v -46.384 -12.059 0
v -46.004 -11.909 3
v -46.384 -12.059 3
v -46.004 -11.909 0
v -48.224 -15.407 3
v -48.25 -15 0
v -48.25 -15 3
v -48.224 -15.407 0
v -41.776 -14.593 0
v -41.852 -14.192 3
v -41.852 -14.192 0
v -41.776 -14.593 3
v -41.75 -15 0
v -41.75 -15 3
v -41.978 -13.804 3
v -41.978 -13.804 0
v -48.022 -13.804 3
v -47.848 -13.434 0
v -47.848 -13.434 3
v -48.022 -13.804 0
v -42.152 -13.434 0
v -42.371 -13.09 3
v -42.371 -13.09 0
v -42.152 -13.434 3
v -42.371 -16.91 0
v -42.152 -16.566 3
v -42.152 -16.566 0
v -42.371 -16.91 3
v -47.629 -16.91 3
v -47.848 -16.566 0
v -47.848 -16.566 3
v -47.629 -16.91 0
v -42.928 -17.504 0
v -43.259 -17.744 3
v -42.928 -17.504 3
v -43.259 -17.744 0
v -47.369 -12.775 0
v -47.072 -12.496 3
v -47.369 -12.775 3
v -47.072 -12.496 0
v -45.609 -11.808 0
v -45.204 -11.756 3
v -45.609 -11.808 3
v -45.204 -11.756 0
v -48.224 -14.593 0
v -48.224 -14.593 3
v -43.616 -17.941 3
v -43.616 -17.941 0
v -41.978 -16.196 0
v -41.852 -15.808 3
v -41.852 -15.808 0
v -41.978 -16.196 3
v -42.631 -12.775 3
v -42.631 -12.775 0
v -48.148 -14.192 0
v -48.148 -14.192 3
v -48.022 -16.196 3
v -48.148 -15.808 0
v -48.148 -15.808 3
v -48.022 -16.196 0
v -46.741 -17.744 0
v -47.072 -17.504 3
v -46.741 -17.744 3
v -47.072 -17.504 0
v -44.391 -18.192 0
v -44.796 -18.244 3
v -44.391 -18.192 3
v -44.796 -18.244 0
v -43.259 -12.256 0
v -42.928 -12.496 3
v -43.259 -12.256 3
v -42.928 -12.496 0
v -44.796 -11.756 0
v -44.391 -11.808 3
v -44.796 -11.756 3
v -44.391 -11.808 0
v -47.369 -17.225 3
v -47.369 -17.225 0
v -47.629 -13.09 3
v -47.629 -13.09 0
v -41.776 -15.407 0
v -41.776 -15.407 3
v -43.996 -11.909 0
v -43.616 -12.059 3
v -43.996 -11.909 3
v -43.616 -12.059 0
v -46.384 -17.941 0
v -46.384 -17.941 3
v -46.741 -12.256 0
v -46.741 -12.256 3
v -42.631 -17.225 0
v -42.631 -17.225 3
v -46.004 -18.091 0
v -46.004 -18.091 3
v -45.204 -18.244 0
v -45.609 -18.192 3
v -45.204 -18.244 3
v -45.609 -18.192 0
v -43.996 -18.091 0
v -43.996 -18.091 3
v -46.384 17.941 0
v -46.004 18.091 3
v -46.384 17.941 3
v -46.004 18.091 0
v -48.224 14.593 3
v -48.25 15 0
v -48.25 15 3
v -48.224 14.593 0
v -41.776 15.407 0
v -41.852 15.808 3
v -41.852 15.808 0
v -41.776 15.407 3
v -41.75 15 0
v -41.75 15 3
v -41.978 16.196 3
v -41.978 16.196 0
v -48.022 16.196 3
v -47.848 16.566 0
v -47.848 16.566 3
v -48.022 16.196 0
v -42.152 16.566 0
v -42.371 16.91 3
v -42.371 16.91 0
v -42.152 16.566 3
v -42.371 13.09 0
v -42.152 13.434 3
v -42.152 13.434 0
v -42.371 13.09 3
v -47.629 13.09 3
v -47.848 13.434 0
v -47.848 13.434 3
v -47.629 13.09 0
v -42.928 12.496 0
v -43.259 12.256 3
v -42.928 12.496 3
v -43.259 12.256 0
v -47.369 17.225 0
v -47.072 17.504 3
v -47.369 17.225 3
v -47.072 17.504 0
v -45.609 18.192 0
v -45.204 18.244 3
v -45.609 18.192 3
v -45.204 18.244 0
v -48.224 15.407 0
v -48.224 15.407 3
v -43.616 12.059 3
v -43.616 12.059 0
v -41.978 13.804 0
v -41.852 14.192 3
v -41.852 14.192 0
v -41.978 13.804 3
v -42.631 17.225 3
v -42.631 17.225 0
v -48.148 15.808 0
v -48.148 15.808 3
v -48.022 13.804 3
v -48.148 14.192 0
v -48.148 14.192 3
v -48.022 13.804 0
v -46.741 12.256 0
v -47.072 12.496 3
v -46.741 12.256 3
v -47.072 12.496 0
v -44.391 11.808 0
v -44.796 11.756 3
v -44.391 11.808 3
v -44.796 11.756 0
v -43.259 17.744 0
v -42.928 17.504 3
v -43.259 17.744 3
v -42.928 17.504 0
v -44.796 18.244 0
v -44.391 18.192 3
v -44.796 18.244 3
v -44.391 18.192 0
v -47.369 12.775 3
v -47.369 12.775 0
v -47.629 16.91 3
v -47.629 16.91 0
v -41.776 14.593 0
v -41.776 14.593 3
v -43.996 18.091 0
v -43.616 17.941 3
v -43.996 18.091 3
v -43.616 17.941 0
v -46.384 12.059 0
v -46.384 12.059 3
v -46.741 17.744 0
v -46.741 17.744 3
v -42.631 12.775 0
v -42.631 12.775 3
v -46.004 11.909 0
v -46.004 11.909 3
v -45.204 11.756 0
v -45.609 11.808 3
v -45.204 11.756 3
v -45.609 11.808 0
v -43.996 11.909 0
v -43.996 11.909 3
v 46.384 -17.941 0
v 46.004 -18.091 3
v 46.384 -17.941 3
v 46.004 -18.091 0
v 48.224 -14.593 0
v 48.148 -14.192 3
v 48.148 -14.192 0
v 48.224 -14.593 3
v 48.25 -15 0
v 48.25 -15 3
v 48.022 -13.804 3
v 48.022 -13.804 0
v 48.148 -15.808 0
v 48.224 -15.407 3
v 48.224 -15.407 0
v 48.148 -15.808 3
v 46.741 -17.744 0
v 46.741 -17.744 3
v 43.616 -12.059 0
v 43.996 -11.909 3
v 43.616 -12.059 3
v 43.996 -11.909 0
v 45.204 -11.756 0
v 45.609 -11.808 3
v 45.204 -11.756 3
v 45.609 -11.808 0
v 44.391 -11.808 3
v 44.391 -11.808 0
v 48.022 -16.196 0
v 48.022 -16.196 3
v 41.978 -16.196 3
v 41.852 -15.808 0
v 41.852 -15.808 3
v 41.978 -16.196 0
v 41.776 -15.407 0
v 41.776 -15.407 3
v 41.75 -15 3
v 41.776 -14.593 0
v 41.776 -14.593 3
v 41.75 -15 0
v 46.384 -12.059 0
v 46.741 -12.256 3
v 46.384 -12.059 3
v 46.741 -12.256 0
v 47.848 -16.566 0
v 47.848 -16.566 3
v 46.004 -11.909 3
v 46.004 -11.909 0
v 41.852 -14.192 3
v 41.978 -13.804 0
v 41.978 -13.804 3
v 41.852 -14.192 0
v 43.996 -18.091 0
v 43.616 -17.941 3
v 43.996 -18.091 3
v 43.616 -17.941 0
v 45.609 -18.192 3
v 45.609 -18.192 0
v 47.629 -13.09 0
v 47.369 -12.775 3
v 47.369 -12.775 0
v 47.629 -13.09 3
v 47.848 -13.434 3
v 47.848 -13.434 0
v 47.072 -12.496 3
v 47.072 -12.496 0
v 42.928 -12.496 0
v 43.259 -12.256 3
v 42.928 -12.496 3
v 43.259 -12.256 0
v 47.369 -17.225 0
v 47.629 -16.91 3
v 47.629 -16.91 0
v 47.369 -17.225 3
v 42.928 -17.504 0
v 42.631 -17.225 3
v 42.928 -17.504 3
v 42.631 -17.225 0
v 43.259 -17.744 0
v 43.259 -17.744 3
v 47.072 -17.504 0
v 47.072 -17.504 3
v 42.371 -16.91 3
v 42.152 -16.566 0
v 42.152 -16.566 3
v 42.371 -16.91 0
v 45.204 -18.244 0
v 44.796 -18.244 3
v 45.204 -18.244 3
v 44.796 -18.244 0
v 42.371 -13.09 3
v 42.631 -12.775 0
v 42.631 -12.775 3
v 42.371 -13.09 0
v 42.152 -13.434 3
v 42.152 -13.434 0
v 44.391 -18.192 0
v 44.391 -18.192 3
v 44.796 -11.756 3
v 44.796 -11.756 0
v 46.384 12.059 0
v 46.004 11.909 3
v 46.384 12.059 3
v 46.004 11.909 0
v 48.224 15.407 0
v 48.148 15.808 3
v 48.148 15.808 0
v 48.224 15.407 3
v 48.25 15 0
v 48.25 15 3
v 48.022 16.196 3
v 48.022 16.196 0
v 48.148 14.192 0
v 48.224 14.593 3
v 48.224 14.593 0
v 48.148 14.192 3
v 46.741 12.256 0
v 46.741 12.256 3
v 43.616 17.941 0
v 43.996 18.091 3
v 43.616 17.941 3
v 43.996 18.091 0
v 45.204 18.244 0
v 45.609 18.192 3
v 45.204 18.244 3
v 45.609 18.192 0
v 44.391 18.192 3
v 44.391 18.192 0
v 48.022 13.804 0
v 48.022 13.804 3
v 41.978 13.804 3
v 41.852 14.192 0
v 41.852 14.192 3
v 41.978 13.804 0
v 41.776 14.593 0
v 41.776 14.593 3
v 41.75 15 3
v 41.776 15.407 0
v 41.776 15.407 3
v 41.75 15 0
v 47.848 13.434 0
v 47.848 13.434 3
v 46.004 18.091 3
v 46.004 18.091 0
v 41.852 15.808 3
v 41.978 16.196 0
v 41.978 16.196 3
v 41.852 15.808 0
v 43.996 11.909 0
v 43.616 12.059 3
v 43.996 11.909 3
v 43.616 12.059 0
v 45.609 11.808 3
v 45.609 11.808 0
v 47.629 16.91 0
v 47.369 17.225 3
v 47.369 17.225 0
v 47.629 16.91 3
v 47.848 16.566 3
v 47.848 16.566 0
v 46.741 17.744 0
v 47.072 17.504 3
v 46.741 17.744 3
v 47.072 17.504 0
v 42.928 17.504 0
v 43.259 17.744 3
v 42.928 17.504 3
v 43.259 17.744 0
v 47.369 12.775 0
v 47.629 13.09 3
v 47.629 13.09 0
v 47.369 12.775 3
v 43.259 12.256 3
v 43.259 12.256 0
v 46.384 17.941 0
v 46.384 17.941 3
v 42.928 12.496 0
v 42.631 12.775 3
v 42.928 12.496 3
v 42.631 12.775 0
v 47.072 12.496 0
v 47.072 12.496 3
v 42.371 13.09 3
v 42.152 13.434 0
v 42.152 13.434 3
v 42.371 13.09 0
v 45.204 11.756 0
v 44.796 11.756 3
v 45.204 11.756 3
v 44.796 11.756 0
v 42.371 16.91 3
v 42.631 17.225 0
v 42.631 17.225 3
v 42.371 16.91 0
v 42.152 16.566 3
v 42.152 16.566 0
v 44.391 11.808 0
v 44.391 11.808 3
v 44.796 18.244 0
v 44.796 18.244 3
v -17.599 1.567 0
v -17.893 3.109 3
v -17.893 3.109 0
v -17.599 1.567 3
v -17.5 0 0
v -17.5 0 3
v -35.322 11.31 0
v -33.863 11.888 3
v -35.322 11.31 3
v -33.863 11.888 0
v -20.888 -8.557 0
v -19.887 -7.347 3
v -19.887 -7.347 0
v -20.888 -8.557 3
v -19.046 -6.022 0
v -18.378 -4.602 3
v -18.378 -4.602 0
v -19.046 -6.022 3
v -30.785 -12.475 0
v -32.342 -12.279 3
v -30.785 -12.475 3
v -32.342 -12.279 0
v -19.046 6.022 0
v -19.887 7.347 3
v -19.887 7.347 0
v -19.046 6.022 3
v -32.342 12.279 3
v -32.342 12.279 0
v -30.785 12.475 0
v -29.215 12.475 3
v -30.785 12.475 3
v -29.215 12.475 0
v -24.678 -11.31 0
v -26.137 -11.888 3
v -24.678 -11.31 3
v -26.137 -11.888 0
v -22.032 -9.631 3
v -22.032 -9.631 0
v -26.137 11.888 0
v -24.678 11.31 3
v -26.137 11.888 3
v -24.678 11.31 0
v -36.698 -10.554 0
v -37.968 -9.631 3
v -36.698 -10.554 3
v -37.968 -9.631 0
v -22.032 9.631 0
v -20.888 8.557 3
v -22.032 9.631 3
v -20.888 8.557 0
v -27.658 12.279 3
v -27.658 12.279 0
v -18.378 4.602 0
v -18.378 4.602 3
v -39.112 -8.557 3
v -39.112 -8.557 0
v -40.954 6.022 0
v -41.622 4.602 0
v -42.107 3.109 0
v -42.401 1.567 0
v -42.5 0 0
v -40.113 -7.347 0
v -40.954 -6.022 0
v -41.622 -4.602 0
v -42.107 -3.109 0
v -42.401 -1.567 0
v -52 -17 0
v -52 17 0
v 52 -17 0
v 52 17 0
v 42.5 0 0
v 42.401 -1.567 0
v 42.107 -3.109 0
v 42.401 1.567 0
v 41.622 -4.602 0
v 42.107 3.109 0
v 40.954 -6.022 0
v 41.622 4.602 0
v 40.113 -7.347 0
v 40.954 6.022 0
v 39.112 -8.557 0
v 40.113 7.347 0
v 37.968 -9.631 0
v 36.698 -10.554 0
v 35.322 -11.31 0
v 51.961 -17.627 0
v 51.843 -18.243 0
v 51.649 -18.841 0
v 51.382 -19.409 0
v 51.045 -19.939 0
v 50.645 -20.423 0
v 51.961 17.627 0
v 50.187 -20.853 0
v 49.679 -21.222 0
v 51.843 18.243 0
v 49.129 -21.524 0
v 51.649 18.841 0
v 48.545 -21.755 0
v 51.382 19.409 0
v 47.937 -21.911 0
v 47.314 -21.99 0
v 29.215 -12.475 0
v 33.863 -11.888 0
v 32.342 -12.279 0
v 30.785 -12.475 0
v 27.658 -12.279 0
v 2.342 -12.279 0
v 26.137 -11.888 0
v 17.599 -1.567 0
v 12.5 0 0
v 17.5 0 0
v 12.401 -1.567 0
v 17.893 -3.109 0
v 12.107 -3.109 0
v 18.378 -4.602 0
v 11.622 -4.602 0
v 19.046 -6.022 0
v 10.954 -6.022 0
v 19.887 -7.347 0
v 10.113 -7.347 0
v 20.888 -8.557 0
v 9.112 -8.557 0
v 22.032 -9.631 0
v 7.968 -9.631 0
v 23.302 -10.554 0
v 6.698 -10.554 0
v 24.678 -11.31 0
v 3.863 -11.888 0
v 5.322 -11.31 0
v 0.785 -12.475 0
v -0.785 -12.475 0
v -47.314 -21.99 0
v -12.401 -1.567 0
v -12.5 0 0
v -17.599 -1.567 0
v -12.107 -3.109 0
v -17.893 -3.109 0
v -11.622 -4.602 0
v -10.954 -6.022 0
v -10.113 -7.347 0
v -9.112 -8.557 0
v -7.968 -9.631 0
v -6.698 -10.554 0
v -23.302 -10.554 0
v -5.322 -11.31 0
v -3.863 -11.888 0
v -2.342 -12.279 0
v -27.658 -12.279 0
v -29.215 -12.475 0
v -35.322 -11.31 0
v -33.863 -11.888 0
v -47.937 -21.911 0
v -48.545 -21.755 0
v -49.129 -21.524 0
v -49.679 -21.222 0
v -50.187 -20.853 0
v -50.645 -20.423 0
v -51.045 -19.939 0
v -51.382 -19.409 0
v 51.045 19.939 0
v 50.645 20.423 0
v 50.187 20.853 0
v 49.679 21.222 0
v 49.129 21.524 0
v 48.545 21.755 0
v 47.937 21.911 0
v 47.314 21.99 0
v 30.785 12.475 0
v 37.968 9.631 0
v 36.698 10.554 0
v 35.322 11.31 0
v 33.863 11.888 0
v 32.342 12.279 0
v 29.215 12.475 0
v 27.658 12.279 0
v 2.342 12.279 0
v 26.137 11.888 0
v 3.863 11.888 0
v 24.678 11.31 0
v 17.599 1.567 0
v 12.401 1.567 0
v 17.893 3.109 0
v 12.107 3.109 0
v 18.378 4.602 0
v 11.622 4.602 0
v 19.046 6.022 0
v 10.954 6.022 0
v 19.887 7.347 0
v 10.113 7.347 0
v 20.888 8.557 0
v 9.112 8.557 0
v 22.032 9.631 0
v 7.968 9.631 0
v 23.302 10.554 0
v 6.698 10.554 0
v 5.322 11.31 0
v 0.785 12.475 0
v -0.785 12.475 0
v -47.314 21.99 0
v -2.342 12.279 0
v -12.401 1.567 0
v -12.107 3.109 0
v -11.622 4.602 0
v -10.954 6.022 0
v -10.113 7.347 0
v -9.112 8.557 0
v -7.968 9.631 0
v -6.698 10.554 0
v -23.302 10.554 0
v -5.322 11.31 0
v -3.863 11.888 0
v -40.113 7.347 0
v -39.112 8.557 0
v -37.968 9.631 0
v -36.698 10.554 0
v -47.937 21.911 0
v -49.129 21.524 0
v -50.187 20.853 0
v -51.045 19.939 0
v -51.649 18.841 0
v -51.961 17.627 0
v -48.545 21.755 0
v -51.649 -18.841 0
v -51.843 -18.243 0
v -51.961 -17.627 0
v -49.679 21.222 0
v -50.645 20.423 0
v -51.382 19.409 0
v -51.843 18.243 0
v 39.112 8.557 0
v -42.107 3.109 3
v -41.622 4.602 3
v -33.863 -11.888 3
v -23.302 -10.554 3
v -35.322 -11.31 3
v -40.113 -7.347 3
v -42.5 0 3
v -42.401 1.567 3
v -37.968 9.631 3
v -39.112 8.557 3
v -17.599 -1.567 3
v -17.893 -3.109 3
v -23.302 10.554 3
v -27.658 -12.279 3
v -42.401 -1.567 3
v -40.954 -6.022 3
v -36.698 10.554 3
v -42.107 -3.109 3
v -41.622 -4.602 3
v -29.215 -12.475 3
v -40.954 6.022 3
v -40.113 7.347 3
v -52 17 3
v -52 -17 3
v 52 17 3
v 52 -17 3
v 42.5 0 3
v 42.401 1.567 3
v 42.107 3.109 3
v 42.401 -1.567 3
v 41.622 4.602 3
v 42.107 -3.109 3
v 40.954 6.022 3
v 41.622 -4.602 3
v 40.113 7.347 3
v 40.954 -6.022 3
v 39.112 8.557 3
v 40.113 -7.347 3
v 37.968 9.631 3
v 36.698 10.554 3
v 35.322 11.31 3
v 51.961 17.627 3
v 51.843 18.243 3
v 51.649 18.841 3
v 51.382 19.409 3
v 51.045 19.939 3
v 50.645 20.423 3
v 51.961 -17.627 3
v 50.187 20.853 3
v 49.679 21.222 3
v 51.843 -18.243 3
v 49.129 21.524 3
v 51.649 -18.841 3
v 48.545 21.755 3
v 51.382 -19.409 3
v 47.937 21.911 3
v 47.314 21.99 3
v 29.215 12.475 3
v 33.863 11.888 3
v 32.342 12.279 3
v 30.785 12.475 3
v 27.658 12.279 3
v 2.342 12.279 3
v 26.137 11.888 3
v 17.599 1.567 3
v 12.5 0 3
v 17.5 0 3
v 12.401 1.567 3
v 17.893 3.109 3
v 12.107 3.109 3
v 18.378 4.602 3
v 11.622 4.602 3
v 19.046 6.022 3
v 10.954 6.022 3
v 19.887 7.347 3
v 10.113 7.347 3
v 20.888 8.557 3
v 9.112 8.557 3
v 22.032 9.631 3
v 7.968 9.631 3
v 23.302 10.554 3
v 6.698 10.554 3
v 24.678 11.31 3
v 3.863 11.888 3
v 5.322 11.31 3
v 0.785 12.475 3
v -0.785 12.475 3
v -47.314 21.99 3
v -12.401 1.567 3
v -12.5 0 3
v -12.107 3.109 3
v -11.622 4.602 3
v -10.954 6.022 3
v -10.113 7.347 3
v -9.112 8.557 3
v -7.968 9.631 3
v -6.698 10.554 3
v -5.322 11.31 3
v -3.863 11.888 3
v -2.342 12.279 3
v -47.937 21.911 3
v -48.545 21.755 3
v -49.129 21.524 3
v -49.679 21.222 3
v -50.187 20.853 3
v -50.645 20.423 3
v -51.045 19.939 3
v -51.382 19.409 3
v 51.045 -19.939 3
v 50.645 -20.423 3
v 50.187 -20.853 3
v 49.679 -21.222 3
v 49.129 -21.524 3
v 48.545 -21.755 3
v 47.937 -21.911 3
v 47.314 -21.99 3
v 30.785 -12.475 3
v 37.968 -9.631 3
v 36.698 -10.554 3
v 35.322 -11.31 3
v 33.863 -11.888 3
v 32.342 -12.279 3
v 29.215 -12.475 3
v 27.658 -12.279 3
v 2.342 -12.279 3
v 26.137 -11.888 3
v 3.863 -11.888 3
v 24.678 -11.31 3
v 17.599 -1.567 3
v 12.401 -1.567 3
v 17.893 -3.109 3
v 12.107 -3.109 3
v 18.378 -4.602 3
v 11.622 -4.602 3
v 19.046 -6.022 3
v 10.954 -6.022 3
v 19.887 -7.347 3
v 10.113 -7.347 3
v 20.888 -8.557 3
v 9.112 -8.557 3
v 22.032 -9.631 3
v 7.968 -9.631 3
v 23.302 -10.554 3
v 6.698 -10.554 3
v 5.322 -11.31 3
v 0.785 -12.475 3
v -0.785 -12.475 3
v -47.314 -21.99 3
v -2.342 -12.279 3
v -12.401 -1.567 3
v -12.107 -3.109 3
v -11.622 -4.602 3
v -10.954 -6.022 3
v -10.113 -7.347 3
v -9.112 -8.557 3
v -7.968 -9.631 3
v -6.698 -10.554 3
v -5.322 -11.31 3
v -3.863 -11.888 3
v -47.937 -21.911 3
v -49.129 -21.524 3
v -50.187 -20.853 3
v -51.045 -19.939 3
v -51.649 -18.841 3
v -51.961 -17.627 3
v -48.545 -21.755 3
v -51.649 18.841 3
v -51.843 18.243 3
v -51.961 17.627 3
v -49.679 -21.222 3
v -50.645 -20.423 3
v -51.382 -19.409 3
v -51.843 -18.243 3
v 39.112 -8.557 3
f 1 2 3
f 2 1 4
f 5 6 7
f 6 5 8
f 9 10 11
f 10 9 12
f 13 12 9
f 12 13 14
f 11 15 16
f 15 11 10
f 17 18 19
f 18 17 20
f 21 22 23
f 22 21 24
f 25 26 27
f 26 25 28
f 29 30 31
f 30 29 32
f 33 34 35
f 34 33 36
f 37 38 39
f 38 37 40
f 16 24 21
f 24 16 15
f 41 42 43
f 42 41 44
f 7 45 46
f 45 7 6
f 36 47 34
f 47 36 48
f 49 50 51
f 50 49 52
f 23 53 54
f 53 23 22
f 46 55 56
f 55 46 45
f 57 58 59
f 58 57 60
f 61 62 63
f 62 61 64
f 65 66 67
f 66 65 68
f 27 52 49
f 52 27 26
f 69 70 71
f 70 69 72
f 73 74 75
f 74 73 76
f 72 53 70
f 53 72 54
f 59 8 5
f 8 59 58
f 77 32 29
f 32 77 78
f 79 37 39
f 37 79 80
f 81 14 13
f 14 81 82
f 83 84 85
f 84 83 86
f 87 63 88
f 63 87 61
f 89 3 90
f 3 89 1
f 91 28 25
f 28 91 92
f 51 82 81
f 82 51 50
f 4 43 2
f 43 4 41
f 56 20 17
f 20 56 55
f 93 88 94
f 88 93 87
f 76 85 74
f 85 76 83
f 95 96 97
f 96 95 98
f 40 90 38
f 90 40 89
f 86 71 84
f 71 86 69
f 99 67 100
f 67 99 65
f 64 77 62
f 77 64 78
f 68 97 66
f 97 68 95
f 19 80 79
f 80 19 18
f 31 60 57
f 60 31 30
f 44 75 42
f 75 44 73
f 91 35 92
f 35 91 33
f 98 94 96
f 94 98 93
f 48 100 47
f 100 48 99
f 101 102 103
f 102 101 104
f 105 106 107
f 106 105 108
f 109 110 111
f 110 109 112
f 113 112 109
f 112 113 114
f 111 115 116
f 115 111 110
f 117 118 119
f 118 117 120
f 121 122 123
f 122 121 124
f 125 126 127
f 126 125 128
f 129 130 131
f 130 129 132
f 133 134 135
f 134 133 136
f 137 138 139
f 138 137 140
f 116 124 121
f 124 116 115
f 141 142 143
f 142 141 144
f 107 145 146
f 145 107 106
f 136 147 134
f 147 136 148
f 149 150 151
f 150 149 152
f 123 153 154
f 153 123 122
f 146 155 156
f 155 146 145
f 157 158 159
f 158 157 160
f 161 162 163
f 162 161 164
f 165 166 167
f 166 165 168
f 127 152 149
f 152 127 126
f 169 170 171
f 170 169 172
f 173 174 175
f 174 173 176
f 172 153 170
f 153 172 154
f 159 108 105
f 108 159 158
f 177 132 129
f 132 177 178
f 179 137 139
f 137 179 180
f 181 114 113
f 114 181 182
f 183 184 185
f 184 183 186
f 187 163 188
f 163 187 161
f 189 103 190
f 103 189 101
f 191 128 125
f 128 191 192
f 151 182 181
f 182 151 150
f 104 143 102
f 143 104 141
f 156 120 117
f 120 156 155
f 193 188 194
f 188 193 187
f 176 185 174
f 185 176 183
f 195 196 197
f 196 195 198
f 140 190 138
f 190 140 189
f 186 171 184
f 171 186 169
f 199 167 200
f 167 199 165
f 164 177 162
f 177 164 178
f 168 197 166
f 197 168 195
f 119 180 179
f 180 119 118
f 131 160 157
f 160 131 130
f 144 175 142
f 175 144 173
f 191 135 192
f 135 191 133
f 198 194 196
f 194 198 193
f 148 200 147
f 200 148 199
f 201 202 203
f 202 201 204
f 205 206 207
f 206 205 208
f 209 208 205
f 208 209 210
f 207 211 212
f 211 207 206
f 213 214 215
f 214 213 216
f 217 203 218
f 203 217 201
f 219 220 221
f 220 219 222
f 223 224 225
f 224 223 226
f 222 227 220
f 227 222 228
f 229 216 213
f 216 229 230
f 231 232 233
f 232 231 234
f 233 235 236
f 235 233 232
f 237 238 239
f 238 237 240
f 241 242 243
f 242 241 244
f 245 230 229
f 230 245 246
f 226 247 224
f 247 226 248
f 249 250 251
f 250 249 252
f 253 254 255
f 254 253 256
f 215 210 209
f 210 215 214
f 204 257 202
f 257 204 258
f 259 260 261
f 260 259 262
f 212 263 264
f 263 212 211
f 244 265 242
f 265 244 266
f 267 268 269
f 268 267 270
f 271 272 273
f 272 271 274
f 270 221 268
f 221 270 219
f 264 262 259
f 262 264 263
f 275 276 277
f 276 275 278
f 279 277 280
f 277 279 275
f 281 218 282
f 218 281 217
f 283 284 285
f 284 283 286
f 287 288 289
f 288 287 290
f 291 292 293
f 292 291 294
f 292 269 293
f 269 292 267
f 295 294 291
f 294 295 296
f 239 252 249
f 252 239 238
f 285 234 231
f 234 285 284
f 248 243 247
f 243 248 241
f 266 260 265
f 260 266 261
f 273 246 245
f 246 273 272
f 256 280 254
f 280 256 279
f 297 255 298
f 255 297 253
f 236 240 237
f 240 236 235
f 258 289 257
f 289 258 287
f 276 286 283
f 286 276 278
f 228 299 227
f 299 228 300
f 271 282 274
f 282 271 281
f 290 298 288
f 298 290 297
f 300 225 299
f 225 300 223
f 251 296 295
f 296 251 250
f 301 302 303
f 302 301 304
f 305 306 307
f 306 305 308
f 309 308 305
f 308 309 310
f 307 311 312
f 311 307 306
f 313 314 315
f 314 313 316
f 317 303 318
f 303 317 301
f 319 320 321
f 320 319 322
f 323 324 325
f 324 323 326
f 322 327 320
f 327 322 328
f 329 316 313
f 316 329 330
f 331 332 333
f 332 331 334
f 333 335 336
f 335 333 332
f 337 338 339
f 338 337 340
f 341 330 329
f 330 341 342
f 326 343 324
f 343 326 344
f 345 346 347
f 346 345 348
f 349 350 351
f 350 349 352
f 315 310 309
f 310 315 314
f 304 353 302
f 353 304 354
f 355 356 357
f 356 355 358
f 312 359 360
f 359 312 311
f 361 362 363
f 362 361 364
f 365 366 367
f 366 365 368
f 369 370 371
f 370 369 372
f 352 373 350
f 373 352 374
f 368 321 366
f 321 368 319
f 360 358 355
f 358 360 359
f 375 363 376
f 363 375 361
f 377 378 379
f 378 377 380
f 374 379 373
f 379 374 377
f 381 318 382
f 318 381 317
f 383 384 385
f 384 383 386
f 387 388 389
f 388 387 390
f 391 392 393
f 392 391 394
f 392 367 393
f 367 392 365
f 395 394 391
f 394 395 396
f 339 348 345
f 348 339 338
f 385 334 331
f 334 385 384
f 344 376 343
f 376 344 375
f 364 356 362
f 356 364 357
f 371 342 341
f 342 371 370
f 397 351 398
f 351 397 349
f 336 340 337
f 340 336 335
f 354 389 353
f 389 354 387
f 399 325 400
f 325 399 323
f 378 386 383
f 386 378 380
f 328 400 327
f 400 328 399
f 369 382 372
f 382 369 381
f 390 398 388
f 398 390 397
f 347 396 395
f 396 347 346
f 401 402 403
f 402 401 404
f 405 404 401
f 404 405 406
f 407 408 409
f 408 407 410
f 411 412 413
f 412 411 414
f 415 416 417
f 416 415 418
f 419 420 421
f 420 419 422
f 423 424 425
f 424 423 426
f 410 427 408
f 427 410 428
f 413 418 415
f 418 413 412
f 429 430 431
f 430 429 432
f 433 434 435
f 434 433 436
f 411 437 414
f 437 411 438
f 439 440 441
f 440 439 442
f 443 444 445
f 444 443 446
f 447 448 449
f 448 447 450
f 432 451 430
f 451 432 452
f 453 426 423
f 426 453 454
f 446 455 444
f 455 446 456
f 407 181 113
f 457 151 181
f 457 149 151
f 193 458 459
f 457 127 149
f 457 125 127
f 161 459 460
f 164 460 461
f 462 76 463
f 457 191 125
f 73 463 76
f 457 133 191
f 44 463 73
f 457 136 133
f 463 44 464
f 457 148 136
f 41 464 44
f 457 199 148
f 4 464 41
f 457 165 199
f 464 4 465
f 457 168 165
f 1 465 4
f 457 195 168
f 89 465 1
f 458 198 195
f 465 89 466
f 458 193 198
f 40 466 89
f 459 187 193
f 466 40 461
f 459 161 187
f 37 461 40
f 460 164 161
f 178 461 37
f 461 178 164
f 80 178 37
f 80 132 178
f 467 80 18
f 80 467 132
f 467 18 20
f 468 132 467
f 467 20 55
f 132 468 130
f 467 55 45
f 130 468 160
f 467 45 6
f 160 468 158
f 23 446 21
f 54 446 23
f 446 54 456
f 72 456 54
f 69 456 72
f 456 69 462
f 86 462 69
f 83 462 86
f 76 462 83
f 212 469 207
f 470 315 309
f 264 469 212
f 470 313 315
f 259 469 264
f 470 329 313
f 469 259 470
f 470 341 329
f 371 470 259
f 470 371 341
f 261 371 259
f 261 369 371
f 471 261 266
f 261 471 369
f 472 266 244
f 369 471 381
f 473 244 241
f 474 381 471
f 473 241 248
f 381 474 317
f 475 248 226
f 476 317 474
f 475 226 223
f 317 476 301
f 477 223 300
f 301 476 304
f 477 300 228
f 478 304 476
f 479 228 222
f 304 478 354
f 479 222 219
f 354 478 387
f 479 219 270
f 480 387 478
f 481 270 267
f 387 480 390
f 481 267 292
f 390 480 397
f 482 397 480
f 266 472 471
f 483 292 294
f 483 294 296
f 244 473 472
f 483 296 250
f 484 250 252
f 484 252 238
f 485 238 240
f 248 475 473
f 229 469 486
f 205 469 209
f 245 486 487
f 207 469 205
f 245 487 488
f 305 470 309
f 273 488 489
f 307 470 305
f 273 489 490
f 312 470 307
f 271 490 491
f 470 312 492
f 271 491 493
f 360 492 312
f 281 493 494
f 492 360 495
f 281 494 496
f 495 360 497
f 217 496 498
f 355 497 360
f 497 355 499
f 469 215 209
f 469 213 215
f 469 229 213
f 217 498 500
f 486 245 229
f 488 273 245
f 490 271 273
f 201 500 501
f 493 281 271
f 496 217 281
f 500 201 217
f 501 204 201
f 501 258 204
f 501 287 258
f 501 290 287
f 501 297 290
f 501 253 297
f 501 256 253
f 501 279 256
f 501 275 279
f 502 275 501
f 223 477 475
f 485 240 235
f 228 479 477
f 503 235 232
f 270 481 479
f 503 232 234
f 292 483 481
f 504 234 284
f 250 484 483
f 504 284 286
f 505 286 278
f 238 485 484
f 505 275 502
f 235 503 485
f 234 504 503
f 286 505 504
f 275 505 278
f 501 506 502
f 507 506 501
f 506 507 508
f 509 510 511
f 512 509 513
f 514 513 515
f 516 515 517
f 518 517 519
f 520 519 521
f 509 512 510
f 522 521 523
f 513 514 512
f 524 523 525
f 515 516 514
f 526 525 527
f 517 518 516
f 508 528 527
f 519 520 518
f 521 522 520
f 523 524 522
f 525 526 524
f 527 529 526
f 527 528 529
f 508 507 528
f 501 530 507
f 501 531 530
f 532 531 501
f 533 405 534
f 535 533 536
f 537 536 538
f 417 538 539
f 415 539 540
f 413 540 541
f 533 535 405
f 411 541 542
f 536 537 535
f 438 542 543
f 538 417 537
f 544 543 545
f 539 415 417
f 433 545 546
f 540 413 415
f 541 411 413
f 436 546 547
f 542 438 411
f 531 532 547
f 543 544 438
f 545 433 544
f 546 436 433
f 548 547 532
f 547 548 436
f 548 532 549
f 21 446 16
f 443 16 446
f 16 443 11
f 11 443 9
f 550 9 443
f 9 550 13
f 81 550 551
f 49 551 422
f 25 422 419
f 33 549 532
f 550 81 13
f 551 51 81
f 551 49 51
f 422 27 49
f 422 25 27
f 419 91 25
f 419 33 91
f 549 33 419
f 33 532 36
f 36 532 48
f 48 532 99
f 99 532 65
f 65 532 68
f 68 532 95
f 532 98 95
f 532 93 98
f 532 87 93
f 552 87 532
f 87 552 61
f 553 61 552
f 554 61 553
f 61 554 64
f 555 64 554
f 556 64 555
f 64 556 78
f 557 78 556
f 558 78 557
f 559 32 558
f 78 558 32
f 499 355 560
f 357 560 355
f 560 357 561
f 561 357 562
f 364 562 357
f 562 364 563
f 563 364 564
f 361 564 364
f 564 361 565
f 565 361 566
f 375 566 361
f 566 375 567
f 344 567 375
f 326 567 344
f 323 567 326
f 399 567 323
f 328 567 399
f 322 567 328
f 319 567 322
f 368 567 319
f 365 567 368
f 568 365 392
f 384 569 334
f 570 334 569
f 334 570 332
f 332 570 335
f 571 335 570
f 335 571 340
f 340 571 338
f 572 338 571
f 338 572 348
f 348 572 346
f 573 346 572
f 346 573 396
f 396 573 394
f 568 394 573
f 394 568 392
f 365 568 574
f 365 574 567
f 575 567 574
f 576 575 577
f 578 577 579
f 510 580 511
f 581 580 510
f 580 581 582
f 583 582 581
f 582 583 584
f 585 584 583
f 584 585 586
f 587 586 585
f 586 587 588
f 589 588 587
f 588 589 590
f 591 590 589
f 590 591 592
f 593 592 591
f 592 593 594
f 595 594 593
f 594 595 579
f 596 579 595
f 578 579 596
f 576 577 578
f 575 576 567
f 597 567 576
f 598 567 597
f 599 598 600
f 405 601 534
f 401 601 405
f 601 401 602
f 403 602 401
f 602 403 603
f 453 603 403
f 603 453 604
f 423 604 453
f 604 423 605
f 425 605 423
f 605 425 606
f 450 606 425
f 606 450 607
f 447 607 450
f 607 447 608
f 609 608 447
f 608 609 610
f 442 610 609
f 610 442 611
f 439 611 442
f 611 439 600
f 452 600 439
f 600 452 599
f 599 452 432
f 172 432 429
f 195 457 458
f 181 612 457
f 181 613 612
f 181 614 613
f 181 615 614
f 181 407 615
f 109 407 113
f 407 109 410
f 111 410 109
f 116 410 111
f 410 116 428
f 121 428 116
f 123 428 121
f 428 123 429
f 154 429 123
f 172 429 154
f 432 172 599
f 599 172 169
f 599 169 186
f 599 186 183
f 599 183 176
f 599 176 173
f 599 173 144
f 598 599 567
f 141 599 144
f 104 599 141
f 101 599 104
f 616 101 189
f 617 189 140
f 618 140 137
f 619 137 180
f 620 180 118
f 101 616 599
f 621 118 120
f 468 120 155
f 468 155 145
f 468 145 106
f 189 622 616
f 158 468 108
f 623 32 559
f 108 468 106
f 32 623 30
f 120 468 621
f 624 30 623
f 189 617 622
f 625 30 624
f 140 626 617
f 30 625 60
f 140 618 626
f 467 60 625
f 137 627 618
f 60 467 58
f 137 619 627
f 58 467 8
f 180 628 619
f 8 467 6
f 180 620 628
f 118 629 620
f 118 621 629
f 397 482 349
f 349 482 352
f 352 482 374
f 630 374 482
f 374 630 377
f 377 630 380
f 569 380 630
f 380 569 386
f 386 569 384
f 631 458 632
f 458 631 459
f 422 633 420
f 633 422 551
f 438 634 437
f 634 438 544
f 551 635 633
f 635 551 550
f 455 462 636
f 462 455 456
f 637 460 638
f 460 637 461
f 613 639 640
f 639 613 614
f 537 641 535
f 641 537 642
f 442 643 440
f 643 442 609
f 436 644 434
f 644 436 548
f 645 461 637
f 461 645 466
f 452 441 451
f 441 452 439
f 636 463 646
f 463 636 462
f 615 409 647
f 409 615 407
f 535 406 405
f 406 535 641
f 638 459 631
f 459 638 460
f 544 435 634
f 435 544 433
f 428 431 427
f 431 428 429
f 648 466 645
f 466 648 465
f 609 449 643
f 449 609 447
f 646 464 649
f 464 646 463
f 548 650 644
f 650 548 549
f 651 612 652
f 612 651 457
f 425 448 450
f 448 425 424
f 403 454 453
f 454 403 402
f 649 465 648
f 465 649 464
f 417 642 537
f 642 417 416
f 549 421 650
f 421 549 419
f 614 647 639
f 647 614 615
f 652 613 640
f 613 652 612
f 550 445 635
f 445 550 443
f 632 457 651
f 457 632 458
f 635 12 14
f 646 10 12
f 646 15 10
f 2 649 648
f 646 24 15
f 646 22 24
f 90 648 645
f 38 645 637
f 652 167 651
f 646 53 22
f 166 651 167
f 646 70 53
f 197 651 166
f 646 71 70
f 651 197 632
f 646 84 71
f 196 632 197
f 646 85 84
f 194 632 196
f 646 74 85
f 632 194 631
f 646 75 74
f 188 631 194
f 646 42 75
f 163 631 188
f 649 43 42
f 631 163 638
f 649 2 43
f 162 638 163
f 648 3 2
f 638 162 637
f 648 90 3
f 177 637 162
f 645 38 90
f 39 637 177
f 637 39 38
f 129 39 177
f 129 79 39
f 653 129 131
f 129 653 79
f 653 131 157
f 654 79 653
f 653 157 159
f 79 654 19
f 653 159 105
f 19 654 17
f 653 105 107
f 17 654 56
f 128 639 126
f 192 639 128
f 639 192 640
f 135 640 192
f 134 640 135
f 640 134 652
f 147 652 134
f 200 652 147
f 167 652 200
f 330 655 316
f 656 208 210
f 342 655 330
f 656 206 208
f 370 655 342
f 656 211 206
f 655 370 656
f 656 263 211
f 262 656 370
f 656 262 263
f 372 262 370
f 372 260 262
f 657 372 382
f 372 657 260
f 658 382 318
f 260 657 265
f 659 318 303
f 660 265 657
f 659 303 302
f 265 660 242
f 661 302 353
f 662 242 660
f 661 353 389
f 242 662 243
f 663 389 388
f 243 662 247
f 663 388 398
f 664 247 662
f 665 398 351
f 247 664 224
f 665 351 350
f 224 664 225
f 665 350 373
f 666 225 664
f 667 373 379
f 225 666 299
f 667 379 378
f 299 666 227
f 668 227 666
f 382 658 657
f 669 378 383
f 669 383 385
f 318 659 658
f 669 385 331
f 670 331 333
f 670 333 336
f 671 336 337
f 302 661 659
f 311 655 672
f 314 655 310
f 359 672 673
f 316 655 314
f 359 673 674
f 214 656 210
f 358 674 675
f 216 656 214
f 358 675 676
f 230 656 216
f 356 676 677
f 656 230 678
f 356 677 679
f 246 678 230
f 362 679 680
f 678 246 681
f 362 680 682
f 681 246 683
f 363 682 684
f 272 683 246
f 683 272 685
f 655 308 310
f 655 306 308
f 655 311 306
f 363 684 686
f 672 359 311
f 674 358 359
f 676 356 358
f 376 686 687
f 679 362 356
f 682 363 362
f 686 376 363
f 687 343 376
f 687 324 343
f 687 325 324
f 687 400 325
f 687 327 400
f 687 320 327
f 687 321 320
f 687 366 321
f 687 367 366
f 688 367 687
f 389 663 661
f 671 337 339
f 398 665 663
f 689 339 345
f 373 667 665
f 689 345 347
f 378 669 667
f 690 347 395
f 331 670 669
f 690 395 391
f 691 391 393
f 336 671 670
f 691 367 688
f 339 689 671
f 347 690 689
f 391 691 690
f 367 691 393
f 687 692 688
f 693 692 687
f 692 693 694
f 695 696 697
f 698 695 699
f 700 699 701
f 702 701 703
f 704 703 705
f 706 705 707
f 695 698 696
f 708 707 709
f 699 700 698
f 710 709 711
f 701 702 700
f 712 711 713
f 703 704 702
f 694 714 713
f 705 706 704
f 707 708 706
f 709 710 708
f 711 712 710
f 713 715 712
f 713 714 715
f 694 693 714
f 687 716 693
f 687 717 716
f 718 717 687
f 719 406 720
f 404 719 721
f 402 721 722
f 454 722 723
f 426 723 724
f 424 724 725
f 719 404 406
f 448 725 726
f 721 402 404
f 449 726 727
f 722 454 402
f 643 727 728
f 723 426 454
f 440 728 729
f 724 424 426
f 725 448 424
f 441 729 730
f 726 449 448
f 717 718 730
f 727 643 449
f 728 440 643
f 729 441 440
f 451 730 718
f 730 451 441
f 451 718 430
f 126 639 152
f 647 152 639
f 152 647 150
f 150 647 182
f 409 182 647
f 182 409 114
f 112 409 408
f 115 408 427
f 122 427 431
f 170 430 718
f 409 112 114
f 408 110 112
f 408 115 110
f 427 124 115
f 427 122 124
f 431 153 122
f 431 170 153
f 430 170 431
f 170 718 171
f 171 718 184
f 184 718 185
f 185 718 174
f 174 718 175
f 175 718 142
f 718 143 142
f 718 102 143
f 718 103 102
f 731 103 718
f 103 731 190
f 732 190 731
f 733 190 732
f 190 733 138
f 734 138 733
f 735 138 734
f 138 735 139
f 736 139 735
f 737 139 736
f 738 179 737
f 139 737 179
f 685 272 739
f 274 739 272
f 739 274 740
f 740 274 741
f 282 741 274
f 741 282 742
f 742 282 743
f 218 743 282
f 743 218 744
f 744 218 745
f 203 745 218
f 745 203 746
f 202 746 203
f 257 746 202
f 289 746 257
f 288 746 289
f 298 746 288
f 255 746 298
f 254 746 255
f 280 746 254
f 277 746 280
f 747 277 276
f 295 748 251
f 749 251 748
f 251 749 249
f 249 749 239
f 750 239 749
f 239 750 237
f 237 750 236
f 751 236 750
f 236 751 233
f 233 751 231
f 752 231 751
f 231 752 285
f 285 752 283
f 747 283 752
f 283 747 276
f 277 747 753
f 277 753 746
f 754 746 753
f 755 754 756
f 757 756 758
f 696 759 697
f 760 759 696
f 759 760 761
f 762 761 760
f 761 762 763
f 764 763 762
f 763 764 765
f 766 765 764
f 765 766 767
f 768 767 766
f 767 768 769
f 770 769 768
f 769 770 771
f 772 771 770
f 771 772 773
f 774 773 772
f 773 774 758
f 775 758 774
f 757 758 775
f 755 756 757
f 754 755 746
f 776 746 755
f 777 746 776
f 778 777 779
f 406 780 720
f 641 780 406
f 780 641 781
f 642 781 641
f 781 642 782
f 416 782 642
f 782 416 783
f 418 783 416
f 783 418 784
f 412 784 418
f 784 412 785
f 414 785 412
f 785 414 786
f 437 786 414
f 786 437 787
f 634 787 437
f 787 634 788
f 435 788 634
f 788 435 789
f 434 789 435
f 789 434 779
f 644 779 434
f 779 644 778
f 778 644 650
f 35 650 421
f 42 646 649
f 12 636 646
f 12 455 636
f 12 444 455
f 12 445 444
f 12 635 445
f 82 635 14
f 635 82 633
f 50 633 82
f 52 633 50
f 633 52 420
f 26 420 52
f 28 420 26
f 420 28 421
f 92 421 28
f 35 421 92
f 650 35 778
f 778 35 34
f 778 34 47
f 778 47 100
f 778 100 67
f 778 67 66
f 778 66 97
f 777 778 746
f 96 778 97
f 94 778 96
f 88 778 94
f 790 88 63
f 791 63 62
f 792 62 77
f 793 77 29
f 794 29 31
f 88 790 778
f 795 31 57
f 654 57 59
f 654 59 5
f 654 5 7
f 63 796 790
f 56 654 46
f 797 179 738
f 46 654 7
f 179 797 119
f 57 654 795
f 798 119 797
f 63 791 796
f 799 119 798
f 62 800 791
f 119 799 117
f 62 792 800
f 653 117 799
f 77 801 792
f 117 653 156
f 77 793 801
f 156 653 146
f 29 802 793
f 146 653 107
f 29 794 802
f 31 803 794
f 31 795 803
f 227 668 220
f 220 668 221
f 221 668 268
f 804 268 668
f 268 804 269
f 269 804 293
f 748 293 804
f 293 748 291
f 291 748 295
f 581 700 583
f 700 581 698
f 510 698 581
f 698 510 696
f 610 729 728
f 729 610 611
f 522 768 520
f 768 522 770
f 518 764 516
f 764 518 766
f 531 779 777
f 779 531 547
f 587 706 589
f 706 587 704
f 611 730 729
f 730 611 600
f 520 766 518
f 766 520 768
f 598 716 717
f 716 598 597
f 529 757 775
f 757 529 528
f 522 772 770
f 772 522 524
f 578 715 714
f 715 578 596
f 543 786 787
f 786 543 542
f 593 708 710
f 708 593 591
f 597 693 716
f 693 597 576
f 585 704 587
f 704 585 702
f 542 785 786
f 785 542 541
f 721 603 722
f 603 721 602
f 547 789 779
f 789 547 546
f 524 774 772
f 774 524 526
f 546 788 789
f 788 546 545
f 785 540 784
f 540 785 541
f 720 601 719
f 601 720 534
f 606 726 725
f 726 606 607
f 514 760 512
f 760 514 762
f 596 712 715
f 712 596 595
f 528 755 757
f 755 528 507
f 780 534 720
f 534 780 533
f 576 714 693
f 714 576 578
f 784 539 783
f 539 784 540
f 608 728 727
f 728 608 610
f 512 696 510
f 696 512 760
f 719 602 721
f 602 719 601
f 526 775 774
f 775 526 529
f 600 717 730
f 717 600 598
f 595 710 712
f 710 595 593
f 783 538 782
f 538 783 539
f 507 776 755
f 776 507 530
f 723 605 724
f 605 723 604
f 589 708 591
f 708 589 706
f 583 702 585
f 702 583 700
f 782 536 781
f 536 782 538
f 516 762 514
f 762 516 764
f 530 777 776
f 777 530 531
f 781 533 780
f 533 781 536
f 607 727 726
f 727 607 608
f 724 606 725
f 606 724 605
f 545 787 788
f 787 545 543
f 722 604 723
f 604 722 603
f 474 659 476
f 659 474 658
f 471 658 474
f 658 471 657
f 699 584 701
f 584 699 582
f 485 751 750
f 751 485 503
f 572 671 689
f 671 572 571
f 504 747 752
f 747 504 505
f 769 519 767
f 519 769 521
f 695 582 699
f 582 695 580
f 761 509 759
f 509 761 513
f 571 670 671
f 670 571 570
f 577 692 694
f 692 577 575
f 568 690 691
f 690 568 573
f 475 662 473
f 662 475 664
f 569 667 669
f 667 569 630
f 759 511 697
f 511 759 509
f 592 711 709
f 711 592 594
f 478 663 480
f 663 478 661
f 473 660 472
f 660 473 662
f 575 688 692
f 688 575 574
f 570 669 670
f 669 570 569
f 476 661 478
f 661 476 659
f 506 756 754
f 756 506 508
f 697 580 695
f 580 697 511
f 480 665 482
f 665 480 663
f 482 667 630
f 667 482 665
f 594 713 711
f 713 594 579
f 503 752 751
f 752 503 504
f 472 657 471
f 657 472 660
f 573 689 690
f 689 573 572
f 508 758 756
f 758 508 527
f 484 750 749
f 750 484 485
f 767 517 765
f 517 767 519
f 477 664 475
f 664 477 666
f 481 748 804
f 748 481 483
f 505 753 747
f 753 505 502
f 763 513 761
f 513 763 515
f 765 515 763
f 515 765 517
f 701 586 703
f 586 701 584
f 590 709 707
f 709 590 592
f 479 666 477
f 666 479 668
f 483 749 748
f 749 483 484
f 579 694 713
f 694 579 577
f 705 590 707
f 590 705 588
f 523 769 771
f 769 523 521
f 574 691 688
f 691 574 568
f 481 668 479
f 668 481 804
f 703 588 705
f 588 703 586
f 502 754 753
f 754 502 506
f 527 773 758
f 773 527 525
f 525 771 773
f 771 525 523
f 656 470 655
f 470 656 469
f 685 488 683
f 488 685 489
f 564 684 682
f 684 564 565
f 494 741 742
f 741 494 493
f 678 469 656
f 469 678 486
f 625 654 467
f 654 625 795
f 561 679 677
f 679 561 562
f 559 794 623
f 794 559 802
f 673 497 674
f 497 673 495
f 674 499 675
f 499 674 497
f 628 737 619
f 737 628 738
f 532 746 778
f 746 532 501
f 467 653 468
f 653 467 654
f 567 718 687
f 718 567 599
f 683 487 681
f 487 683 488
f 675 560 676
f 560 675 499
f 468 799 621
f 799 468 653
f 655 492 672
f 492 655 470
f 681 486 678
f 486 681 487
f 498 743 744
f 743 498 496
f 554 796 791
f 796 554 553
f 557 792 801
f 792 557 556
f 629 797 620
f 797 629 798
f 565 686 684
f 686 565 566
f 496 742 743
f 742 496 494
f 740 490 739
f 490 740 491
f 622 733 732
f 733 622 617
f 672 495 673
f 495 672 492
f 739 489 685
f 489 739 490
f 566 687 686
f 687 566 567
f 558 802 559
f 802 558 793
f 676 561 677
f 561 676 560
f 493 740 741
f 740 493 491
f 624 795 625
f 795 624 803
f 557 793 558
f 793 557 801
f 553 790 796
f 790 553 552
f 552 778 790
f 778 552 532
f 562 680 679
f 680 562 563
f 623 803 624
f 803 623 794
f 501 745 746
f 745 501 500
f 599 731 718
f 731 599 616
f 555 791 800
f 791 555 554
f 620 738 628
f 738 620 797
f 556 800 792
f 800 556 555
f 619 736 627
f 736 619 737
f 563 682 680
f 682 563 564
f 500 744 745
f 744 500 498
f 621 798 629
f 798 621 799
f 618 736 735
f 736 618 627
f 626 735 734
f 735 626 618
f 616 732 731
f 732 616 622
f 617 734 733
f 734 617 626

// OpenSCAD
$fn = 50;


difference() {
	union() {
		hull() {
			translate(v = [-47.0000000000, 17.0000000000, 0]) {
				cylinder(h = 3, r = 5);
			}
			translate(v = [47.0000000000, 17.0000000000, 0]) {
				cylinder(h = 3, r = 5);
			}
			translate(v = [-47.0000000000, -17.0000000000, 0]) {
				cylinder(h = 3, r = 5);
			}
			translate(v = [47.0000000000, -17.0000000000, 0]) {
				cylinder(h = 3, r = 5);
			}
		}
	}
	union() {
		#translate(v = [-45.0000000000, -15.0000000000, -100.0000000000]) {
			cylinder(h = 200, r = 3.2500000000);
		}
		#translate(v = [-45.0000000000, 15.0000000000, -100.0000000000]) {
			cylinder(h = 200, r = 3.2500000000);
		}
		#translate(v = [45.0000000000, -15.0000000000, -100.0000000000]) {
			cylinder(h = 200, r = 3.2500000000);
		}
		#translate(v = [45.0000000000, 15.0000000000, -100.0000000000]) {
			cylinder(h = 200, r = 3.2500000000);
		}
		#translate(v = [-30.0000000000, 0, 0]) {
			cylinder(h = 3, r = 12.5000000000);
		}
		#cylinder(h = 3, r = 12.5000000000);
		#translate(v = [30.0000000000, 0, 0]) {
			cylinder(h = 3, r = 12.5000000000);
		}
	}
}
